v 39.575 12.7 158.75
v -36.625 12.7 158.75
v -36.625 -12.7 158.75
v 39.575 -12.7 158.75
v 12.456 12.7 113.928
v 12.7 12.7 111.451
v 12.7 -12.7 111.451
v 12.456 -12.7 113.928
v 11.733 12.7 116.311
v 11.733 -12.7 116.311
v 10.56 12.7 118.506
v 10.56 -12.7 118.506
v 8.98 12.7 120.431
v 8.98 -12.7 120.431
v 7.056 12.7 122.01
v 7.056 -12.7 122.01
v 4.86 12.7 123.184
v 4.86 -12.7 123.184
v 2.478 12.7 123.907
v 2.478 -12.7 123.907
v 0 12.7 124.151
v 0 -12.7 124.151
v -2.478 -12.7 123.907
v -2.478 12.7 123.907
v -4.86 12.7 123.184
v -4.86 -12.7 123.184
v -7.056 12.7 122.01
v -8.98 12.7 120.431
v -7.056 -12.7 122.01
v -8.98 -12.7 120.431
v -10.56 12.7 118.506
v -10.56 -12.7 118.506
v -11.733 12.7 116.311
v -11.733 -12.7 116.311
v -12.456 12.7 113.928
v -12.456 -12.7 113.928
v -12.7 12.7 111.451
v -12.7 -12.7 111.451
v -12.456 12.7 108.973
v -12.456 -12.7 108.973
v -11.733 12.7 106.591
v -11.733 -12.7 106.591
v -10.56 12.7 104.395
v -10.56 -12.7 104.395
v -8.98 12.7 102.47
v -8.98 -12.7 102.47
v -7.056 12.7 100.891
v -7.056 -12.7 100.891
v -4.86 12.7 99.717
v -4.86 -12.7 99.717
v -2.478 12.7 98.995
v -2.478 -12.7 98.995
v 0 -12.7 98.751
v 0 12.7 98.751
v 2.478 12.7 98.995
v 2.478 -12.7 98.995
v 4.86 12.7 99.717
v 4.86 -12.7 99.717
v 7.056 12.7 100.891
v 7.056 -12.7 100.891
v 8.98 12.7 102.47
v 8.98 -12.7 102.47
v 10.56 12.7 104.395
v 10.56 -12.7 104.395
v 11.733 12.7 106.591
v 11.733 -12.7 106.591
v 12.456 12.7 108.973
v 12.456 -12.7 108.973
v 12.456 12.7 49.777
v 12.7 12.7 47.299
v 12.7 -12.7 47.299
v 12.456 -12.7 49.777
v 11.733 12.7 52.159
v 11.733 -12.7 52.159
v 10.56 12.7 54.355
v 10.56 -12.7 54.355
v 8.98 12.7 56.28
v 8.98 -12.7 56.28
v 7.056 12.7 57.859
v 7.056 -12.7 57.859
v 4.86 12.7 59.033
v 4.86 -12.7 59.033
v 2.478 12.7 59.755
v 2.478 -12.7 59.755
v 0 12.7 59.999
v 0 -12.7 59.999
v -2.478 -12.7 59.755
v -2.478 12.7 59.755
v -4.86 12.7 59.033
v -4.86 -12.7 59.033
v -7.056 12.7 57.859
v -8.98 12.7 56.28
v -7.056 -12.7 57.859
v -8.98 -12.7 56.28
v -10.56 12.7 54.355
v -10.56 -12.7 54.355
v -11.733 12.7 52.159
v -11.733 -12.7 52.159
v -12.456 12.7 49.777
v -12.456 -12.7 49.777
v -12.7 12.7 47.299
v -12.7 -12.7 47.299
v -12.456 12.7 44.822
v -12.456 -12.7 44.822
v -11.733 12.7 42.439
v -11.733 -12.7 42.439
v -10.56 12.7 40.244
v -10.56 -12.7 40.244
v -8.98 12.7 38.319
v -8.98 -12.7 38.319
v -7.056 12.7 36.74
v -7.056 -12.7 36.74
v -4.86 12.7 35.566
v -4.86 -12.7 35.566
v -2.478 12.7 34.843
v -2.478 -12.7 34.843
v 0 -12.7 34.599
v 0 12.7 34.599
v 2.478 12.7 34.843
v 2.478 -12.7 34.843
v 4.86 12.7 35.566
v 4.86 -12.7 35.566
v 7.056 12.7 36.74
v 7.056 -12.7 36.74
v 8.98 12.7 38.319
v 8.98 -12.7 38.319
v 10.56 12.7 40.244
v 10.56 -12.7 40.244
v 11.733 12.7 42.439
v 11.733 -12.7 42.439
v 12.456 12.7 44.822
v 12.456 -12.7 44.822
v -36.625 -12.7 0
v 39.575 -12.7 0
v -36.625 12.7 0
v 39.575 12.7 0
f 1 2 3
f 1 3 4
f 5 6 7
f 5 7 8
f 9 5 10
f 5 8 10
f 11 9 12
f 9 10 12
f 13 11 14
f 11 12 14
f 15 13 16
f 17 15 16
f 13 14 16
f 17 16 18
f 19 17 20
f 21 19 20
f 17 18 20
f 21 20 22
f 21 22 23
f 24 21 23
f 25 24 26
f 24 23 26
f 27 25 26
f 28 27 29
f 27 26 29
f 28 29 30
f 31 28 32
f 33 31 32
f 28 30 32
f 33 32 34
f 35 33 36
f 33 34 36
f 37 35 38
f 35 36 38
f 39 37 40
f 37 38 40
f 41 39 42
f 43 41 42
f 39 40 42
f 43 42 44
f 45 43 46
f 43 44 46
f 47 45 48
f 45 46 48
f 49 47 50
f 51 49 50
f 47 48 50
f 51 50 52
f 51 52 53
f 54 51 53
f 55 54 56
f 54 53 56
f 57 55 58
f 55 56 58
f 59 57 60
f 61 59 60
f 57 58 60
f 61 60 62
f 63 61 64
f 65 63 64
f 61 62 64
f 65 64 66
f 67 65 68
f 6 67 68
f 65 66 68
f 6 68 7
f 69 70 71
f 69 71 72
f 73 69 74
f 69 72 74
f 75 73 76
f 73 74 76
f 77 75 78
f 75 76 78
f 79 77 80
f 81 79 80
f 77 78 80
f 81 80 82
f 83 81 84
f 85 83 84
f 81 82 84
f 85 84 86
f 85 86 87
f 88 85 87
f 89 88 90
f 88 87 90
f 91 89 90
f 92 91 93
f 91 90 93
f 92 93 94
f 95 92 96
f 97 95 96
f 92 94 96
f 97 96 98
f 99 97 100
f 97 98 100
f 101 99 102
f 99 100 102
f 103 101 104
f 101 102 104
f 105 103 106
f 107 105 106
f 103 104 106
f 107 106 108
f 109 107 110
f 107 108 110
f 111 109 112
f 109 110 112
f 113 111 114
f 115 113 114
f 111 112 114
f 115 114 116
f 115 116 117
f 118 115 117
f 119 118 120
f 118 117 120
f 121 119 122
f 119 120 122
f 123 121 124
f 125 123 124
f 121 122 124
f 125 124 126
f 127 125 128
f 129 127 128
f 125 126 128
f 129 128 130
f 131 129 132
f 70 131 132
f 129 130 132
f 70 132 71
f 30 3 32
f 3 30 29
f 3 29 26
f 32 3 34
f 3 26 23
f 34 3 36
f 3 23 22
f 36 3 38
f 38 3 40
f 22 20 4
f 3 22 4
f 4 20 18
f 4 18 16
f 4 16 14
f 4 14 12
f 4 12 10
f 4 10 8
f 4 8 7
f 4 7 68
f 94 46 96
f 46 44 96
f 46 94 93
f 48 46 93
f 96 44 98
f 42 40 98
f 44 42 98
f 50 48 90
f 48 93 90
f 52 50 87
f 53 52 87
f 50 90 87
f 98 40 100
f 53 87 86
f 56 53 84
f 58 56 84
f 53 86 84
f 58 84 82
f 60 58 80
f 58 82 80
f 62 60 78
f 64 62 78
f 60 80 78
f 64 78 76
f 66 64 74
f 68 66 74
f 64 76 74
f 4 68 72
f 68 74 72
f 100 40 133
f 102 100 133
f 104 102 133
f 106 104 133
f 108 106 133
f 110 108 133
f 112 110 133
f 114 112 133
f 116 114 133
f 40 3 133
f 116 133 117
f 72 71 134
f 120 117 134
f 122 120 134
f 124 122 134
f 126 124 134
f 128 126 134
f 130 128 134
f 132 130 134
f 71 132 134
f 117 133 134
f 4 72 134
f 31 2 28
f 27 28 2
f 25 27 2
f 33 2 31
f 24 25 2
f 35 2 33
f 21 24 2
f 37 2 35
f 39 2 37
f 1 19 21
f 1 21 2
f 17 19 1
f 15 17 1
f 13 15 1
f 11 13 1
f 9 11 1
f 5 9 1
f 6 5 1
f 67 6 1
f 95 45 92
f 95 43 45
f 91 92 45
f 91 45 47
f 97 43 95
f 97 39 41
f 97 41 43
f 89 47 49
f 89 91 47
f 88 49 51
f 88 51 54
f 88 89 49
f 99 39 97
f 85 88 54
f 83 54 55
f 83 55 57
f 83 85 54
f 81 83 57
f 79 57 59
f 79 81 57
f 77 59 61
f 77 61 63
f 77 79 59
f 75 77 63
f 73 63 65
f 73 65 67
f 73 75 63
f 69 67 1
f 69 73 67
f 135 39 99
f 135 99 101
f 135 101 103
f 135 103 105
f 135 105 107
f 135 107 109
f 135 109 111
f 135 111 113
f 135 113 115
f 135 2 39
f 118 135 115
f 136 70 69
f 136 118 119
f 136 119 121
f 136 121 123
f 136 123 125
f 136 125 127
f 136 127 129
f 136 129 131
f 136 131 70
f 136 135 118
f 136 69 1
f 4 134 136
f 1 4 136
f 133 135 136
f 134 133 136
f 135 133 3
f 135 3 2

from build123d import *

# Parameters (mm, degrees)
F0_W     = 76.2
F0_H     = 25.4
F1_DEPTH = 158.75
F2_R     = 12.7
F3_DEPTH = 25.4


with BuildPart() as f1:
    # F0 (on Top) → F1 (new body)
    with BuildSketch(Plane.XY):
        with Locations((1.475252, 0)):
            Rectangle(F0_W, F0_H)
    extrude(amount=F1_DEPTH)

    # F2 (on face) → F3 (cut)
    with BuildSketch(Plane.XZ.offset(12.7)):
        with Locations((0, 111.450641)):
            Circle(F2_R)
        with Locations((0, 47.299359)):
            Circle(F2_R)
    extrude(amount=-F3_DEPTH, mode=Mode.SUBTRACT)


solid = f1.part
